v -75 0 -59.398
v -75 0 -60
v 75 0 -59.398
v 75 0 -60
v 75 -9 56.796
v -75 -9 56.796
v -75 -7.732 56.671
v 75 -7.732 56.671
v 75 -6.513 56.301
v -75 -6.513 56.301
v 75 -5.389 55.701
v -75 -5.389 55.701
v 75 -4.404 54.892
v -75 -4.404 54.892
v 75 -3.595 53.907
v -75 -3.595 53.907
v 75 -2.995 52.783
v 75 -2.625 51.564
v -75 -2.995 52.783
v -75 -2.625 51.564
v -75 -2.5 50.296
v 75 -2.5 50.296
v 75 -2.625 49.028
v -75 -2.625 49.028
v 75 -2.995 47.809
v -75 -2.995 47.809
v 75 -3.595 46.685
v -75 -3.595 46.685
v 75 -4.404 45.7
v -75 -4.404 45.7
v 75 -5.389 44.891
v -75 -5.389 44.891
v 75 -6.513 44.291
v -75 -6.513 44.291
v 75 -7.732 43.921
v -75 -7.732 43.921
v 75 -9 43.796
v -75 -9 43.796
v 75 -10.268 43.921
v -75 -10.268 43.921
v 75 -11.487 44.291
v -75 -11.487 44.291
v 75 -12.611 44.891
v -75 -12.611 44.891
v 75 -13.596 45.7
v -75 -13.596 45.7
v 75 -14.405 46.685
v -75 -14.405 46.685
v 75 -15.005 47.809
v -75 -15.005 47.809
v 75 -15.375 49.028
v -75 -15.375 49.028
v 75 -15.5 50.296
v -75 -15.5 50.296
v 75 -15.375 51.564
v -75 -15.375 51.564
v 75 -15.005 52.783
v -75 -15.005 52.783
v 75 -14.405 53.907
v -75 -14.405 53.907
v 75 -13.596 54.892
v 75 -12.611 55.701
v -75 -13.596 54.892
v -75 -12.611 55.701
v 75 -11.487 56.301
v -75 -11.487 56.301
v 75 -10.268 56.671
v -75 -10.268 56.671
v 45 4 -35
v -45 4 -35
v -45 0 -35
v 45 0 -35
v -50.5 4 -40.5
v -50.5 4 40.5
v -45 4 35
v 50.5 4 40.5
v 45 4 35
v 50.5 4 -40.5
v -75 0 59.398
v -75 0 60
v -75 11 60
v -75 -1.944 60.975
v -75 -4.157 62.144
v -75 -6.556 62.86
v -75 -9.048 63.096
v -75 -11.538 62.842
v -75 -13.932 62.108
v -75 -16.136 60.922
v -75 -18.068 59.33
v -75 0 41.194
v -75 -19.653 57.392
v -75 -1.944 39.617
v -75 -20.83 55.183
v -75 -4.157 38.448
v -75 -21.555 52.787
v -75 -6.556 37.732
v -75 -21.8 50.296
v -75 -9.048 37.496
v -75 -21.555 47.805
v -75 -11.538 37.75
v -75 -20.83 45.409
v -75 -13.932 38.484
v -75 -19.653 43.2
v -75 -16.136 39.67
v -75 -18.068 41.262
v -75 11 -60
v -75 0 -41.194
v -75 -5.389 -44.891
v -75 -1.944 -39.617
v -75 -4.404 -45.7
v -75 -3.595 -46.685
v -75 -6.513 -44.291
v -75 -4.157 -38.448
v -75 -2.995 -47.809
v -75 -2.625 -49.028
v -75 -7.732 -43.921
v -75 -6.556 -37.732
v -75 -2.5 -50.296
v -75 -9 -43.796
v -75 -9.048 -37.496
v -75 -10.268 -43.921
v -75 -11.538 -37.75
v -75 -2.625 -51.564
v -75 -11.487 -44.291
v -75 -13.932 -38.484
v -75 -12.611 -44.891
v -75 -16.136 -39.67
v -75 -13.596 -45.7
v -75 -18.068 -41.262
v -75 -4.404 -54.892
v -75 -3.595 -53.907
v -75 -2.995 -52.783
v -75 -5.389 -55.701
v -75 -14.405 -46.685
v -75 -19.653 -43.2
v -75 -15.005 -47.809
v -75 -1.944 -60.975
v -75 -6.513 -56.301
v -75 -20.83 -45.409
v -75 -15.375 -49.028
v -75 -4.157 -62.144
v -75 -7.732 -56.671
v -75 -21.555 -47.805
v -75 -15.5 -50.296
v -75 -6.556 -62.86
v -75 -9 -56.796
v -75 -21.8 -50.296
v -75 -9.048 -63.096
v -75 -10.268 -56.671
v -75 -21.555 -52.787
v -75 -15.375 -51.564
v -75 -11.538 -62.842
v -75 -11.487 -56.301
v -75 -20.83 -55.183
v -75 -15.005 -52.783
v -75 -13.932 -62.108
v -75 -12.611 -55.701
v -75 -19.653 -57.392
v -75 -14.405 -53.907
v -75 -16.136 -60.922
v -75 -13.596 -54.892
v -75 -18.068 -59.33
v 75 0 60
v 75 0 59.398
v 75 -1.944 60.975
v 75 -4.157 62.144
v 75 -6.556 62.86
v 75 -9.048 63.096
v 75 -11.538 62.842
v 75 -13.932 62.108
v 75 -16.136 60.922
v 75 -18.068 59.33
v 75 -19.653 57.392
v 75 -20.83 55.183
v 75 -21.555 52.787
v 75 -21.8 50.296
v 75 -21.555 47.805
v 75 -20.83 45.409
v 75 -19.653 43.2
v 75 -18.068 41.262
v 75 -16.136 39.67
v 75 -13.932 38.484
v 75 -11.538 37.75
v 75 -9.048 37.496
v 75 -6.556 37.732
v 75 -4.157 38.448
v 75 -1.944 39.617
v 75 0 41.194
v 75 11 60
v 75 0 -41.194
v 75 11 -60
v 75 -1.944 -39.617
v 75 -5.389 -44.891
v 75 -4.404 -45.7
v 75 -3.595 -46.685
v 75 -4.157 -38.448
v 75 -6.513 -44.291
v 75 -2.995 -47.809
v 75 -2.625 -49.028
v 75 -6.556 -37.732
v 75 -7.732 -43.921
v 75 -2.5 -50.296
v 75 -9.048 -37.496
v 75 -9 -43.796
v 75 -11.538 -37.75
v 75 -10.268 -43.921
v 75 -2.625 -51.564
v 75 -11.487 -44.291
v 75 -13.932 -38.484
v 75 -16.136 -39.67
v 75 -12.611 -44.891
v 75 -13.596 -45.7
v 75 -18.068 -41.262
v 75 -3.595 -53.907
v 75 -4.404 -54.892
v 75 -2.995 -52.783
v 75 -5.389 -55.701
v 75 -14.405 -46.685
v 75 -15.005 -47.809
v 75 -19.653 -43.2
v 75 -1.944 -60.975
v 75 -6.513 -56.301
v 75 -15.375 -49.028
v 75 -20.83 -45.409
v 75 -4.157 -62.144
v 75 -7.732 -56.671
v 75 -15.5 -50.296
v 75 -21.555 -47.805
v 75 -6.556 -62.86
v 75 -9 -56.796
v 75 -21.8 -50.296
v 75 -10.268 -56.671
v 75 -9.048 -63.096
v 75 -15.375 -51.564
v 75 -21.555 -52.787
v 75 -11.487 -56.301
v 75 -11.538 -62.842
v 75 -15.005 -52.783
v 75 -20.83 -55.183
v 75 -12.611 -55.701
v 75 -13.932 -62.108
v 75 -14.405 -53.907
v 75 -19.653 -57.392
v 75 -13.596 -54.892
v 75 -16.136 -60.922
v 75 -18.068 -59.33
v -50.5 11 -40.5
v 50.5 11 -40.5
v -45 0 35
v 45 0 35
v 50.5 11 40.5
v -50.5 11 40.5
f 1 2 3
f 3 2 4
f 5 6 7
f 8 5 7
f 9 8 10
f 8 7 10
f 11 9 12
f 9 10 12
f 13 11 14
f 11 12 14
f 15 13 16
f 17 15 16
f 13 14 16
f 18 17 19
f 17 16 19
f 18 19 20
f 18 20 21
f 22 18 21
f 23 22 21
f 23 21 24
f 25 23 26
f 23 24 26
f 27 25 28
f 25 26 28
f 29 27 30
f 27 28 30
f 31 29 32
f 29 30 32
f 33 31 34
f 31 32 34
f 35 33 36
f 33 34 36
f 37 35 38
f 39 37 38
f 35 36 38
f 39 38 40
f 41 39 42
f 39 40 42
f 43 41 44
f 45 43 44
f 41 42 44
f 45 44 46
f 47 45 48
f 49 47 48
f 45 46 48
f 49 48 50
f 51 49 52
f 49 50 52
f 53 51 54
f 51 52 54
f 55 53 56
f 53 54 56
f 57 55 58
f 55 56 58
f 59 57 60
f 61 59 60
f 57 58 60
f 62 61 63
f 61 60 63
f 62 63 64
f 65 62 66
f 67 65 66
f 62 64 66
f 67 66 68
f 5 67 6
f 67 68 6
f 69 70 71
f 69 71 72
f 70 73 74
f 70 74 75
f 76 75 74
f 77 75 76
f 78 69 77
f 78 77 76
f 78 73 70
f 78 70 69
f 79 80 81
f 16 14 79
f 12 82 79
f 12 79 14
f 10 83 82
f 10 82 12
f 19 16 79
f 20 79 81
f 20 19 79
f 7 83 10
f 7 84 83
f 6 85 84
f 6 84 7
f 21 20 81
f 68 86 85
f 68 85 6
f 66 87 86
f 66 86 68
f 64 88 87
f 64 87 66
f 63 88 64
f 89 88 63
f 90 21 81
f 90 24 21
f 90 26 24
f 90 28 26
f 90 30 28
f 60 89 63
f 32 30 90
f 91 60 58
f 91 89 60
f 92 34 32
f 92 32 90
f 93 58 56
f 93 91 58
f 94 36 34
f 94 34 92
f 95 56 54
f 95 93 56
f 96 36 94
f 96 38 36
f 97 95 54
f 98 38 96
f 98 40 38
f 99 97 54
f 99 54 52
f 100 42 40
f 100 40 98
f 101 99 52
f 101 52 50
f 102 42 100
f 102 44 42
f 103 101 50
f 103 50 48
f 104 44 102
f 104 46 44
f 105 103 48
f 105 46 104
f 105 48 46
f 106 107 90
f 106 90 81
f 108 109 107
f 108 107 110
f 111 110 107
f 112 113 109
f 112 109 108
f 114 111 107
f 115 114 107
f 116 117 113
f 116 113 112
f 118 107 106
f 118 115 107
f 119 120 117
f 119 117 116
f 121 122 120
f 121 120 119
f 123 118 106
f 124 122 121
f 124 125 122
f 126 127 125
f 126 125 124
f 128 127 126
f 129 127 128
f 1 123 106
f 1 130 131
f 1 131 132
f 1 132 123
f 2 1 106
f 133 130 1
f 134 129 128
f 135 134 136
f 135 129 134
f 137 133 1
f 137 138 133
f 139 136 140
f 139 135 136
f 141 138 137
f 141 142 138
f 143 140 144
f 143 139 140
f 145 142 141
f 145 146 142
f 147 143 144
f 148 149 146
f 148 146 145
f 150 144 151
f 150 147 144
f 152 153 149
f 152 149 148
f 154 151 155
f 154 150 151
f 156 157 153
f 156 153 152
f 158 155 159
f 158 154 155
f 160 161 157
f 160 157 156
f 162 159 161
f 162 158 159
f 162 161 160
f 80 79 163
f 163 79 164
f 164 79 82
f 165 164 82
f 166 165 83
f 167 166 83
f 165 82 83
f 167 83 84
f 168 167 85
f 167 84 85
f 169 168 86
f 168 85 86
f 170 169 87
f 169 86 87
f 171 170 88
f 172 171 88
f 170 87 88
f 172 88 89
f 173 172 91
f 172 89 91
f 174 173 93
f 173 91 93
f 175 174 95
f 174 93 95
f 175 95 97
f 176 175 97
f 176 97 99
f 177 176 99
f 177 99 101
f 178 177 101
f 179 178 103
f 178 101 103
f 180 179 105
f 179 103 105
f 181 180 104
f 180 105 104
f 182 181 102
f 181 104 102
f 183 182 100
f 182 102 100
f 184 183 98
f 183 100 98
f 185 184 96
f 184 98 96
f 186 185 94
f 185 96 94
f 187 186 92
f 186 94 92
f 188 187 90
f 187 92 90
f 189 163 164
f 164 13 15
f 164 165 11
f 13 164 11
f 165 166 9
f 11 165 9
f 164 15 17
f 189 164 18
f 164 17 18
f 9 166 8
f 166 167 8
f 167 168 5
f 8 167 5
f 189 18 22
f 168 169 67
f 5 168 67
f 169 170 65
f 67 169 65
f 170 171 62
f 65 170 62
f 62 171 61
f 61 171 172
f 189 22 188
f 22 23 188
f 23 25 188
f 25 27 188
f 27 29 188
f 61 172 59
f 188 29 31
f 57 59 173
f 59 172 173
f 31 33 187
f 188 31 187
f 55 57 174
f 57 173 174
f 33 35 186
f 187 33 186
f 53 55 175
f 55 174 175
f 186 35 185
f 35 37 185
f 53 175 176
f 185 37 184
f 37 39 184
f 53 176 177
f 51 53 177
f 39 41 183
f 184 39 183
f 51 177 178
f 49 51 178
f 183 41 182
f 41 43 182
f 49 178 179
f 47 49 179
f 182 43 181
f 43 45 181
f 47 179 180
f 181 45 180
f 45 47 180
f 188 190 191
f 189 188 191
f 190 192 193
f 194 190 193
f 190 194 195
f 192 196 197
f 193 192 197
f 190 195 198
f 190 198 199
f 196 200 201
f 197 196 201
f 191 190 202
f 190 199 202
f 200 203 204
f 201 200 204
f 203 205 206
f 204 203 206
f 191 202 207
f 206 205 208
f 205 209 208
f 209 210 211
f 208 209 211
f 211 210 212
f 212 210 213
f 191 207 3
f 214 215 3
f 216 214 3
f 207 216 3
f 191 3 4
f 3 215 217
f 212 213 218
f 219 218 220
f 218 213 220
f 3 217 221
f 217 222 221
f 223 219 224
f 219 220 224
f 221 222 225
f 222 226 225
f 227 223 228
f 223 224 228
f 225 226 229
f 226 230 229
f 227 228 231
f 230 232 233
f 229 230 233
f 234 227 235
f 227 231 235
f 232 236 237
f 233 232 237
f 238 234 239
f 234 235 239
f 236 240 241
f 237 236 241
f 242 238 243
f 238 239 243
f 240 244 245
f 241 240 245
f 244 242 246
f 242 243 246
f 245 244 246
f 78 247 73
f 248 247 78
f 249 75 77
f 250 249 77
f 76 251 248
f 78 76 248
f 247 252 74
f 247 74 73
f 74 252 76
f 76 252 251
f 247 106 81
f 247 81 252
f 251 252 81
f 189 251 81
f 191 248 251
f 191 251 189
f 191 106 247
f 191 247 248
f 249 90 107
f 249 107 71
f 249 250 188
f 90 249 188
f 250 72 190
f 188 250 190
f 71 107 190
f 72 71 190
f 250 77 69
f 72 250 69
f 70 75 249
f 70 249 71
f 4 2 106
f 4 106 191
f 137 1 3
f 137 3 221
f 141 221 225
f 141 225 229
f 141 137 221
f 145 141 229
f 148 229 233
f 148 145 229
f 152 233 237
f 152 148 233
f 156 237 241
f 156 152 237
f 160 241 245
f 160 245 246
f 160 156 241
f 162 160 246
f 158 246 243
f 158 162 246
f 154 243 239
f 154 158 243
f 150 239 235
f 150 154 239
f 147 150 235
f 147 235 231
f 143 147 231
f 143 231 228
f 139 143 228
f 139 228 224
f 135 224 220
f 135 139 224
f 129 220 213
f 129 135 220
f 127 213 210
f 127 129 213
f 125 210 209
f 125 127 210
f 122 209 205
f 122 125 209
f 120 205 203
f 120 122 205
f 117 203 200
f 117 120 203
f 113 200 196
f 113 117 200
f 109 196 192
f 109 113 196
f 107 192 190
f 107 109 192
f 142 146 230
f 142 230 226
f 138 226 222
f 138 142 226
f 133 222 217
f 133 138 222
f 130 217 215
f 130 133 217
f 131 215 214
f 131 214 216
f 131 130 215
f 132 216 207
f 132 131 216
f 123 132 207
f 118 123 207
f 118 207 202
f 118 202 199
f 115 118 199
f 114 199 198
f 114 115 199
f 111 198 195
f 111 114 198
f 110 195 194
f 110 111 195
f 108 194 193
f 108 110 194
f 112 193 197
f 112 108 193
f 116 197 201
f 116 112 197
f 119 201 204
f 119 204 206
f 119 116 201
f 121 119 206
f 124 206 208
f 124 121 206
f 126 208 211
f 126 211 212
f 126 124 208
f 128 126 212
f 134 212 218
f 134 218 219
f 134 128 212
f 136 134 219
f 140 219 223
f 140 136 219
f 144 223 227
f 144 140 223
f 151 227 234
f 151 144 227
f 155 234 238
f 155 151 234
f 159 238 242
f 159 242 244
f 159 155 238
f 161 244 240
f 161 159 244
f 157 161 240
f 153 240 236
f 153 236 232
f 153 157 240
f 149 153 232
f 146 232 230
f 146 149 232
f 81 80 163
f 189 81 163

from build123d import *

# Parameters (mm, degrees)
SKETCH3_W           = 150
SKETCH3_H           = 120
BOSS_EXTRUDE1_DEPTH = 11
SKETCH4_W           = 101
SKETCH4_H           = 81
CUT_EXTRUDE1_DEPTH  = 7
SKETCH5_W           = 90
SKETCH5_H           = 70
CUT_EXTRUDE2_DEPTH  = 5
SKETCH7_R           = 6.5
BOSS_EXTRUDE2_DEPTH = 150


with BuildPart() as part:
    # Sketch3 → Boss-Extrude1 (new body)
    with BuildSketch(Plane(origin=(0, 0, 0), x_dir=(1, 0, 0), z_dir=(0, 1, 0))):
        Rectangle(SKETCH3_W, SKETCH3_H)
    extrude(amount=BOSS_EXTRUDE1_DEPTH)

    # Sketch4 → Cut-Extrude1 (cut)
    with BuildSketch(Plane(origin=(0, 11, 0), x_dir=(1, 0, 0), z_dir=(0, 1, 0))):
        Rectangle(SKETCH4_W, SKETCH4_H)
    extrude(amount=-CUT_EXTRUDE1_DEPTH, mode=Mode.SUBTRACT)

    # Sketch5 → Cut-Extrude2 (cut, through all)
    with BuildSketch(Plane(origin=(0, 4, 0), x_dir=(1, 0, 0), z_dir=(0, 1, 0))):
        Rectangle(SKETCH5_W, SKETCH5_H)
    extrude(amount=-CUT_EXTRUDE2_DEPTH, mode=Mode.SUBTRACT)

    # Sketch7 → Boss-Extrude2 (add)
    with BuildSketch(Plane.ZY.offset(75)):
        with BuildLine():
            Line((41.194351798, 0), (59.397648202, 0))
            ThreePointArc((59.397648202, 0), (50.296, -21.8), (41.194351798, 0))
        make_face()
        with Locations((50.296, -9)):
            Circle(SKETCH7_R, mode=Mode.SUBTRACT)
    boss_extrude2 = extrude(amount=-BOSS_EXTRUDE2_DEPTH)

    # Mirror1: Boss-Extrude2 across plane
    add(boss_extrude2.mirror(Plane.XY))


solid = part.part
